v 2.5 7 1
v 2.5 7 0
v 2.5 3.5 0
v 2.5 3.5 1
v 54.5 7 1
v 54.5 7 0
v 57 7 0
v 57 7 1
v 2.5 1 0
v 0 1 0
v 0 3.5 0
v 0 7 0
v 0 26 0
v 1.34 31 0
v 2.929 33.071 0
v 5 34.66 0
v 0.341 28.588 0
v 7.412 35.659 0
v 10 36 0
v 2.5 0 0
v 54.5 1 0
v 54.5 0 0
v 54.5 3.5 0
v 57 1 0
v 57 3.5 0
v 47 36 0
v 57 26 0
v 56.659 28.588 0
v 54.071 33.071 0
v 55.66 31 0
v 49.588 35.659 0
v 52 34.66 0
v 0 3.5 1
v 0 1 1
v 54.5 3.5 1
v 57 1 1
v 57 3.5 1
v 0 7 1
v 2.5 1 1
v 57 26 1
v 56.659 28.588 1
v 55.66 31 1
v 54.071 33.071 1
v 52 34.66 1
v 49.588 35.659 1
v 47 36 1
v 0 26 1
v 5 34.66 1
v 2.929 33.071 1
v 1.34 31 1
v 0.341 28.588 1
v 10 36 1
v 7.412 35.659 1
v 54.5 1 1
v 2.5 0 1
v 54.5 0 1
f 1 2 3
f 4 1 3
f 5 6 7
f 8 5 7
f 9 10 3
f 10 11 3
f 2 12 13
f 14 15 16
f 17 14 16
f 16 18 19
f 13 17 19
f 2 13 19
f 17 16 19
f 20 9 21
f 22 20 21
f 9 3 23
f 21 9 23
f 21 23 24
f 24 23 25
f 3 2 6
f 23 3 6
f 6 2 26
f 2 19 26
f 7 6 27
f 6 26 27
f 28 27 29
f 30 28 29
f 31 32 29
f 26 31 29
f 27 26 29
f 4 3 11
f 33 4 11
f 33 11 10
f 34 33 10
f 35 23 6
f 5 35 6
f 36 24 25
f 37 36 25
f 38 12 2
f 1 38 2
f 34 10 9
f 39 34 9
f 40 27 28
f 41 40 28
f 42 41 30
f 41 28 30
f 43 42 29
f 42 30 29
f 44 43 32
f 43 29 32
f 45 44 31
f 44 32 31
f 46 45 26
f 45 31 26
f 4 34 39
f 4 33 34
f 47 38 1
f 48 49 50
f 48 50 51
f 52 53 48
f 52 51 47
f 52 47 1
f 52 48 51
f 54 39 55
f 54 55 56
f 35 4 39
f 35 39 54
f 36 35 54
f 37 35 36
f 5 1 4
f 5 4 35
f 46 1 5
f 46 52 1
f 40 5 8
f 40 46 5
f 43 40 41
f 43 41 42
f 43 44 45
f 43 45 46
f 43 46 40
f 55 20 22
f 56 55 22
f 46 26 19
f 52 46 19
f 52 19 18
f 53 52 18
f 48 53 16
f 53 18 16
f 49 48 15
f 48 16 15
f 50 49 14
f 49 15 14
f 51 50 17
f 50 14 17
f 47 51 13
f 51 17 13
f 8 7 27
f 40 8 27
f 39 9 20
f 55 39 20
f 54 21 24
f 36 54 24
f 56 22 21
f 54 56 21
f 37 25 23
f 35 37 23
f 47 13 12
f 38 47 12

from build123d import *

# Parameters (mm, degrees)
BOSS_EXTRUDE1_DEPTH = 1


with BuildPart() as part:
    # Sketch1 → Boss-Extrude1 (new body)
    with BuildSketch(Plane.XY):
        with BuildLine():
            Line((0, 1), (2.5, 1))
            Line((2.5, 1), (2.5, 0))
            Line((2.5, 0), (54.5, 0))
            Line((54.5, 0), (54.5, 1))
            Line((54.5, 1), (57, 1))
            Line((57, 1), (57, 3.5))
            Line((57, 3.5), (54.5, 3.5))
            Line((54.5, 3.5), (54.5, 7))
            Line((54.5, 7), (57, 7))
            Line((57, 7), (57, 26))
            ThreePointArc((57, 26), (54.071067812, 33.071067812), (47, 36))
            Line((47, 36), (10, 36))
            ThreePointArc((10, 36), (2.928932188, 33.071067812), (0, 26))
            Line((0, 26), (0, 7))
            Line((0, 7), (2.5, 7))
            Line((2.5, 7), (2.5, 3.5))
            Line((2.5, 3.5), (0, 3.5))
            Line((0, 3.5), (0, 1))
        make_face()
    extrude(amount=BOSS_EXTRUDE1_DEPTH)


solid = part.part
